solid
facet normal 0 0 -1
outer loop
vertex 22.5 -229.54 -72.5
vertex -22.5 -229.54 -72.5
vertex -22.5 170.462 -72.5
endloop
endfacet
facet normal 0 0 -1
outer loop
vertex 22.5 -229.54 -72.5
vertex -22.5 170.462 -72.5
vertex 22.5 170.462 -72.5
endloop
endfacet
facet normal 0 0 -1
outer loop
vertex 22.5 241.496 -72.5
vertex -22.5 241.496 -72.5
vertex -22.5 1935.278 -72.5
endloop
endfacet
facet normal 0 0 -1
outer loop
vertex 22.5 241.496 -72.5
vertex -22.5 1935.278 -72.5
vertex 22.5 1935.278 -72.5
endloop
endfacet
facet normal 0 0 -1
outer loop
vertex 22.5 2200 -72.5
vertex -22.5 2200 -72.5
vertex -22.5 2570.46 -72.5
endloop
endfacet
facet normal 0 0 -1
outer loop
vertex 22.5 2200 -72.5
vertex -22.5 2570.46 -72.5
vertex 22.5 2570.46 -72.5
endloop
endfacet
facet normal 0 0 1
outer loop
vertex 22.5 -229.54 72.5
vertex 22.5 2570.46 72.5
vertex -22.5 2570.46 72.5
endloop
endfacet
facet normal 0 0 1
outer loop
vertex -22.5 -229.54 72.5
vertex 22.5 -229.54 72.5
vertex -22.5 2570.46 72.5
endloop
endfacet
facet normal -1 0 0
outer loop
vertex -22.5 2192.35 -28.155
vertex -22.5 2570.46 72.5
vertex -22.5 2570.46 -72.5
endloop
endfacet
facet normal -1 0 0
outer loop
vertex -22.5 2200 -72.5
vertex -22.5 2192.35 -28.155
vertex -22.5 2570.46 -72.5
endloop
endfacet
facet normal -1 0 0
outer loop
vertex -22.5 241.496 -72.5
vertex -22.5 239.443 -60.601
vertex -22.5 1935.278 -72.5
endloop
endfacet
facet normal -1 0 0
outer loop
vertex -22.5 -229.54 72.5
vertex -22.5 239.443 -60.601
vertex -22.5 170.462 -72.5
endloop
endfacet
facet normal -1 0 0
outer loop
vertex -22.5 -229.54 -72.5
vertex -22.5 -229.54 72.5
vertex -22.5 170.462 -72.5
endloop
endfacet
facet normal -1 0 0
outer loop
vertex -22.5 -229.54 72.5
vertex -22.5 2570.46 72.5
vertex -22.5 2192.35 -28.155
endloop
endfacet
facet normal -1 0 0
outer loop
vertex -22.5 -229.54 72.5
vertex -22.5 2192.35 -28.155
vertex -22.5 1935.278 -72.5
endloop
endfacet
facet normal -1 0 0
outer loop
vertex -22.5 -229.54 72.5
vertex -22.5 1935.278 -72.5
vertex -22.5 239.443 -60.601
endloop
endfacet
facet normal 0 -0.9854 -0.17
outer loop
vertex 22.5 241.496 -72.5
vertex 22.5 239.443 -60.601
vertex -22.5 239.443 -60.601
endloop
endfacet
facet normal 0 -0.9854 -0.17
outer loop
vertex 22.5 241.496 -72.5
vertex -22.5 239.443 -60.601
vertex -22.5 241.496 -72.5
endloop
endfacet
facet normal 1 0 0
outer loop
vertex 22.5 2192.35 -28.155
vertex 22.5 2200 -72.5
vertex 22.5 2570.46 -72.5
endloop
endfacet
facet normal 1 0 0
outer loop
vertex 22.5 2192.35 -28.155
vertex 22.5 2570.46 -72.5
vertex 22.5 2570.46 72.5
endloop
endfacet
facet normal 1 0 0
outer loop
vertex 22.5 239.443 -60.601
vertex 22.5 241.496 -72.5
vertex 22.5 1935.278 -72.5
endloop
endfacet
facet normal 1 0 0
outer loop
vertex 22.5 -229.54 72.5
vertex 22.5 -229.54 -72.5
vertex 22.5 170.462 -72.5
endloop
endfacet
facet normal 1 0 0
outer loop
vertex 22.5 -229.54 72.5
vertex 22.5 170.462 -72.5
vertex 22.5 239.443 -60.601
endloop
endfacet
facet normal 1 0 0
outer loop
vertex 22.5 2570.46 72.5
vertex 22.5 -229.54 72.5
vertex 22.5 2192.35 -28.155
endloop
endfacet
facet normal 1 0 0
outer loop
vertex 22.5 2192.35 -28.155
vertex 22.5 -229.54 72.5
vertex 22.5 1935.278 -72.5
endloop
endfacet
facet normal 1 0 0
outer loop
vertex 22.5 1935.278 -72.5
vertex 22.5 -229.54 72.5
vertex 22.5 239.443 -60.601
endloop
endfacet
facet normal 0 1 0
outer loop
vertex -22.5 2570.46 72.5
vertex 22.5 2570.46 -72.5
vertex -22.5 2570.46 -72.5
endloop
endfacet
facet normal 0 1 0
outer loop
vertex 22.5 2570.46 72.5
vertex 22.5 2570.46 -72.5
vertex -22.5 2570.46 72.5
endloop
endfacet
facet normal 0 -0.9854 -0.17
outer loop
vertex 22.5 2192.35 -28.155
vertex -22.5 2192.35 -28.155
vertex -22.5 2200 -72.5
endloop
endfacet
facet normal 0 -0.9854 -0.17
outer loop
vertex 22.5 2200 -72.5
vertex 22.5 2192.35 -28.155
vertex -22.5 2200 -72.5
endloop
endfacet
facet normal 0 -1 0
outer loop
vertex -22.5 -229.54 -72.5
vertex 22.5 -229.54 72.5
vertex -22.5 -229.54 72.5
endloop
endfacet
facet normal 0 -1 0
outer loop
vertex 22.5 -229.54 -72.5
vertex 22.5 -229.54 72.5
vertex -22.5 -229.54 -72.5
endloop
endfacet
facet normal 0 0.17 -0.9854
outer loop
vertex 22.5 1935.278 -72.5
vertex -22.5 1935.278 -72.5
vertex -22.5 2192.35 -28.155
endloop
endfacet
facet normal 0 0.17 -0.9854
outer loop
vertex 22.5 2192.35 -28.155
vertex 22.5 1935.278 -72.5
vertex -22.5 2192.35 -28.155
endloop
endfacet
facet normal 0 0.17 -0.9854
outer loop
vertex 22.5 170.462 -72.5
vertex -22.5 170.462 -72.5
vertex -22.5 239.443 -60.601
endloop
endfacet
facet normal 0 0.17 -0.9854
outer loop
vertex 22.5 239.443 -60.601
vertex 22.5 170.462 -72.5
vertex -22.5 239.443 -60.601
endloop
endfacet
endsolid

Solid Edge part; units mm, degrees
sketch "Sketch1" plane through (0, 0, 0) normal (0, -1, 0) x (1, 0, 0)
  line L0 (-22.5, -72.5) -> (22.5, -72.5)
  line L1 (22.5, -72.5) -> (22.5, 72.5)
  line L2 (22.5, 72.5) -> (-22.5, 72.5)
  line L3 (-22.5, 72.5) -> (-22.5, -72.5)
extrude "Protrusion1" add sketch "Sketch1" against normal blind 2200
sketch "Sketch2" plane through (-22.5, 1172.7247, 0) normal (-1, 0, 0) x (0, 1, 0)
  line L0 (-1002.2628, 72.5) -> (-933.2816, 60.6007)
  line L1 (-933.2816, 60.6007) -> (-929.9001, 80.2034)
  line L2 (-929.9001, 80.2034) -> (-998.4381, 94.6725)
  line L3 (-998.4381, 94.6725) -> (-1002.2628, 72.5)
extrude "ExtrudedCutout_2" cut sketch "Sketch2" against normal blind 199.504
sketch "Sketch3" plane through (0, 0, 0) normal (0, -1, 0) x (1, 0, 0)
  line L0 (-22.5, -72.5) -> (22.5, -72.5)
  line L1 (22.5, -72.5) -> (22.5, 72.5)
  line L2 (22.5, 72.5) -> (-22.5, 72.5)
  line L3 (-22.5, 72.5) -> (-22.5, -72.5)
extrude "ExtrudedProtrusion_2" add sketch "Sketch3" along normal blind 229.54
sketch "Sketch4" plane through (0, 2200, 22.8323) normal (0, 1, 0) x (-1, 0, 0)
  line L0 (-22.5, -95.3323) -> (22.5, -95.3323)
  line L1 (22.5, -95.3323) -> (22.5, 49.6677)
  line L2 (22.5, 49.6677) -> (-22.5, 49.6677)
  line L3 (-22.5, 49.6677) -> (-22.5, -95.3323)
extrude "ExtrudedProtrusion_3" add sketch "Sketch4" along normal blind 370.46
sketch "Sketch5" plane through (-22.5, 1185.23, 0) normal (-1, 0, 0) x (0, -1, 0)
  line L0 (-1014.77, -72.5) -> (-750.0476, -72.5)
  line L1 (-750.0476, -72.5) -> (-1007.1205, -28.1549)
  line L2 (-1007.1205, -28.1549) -> (-1014.77, -72.5)
extrude "ExtrudedCutout_5" cut sketch "Sketch5" against normal blind 98.6618
properties material "Wood, Pine"
